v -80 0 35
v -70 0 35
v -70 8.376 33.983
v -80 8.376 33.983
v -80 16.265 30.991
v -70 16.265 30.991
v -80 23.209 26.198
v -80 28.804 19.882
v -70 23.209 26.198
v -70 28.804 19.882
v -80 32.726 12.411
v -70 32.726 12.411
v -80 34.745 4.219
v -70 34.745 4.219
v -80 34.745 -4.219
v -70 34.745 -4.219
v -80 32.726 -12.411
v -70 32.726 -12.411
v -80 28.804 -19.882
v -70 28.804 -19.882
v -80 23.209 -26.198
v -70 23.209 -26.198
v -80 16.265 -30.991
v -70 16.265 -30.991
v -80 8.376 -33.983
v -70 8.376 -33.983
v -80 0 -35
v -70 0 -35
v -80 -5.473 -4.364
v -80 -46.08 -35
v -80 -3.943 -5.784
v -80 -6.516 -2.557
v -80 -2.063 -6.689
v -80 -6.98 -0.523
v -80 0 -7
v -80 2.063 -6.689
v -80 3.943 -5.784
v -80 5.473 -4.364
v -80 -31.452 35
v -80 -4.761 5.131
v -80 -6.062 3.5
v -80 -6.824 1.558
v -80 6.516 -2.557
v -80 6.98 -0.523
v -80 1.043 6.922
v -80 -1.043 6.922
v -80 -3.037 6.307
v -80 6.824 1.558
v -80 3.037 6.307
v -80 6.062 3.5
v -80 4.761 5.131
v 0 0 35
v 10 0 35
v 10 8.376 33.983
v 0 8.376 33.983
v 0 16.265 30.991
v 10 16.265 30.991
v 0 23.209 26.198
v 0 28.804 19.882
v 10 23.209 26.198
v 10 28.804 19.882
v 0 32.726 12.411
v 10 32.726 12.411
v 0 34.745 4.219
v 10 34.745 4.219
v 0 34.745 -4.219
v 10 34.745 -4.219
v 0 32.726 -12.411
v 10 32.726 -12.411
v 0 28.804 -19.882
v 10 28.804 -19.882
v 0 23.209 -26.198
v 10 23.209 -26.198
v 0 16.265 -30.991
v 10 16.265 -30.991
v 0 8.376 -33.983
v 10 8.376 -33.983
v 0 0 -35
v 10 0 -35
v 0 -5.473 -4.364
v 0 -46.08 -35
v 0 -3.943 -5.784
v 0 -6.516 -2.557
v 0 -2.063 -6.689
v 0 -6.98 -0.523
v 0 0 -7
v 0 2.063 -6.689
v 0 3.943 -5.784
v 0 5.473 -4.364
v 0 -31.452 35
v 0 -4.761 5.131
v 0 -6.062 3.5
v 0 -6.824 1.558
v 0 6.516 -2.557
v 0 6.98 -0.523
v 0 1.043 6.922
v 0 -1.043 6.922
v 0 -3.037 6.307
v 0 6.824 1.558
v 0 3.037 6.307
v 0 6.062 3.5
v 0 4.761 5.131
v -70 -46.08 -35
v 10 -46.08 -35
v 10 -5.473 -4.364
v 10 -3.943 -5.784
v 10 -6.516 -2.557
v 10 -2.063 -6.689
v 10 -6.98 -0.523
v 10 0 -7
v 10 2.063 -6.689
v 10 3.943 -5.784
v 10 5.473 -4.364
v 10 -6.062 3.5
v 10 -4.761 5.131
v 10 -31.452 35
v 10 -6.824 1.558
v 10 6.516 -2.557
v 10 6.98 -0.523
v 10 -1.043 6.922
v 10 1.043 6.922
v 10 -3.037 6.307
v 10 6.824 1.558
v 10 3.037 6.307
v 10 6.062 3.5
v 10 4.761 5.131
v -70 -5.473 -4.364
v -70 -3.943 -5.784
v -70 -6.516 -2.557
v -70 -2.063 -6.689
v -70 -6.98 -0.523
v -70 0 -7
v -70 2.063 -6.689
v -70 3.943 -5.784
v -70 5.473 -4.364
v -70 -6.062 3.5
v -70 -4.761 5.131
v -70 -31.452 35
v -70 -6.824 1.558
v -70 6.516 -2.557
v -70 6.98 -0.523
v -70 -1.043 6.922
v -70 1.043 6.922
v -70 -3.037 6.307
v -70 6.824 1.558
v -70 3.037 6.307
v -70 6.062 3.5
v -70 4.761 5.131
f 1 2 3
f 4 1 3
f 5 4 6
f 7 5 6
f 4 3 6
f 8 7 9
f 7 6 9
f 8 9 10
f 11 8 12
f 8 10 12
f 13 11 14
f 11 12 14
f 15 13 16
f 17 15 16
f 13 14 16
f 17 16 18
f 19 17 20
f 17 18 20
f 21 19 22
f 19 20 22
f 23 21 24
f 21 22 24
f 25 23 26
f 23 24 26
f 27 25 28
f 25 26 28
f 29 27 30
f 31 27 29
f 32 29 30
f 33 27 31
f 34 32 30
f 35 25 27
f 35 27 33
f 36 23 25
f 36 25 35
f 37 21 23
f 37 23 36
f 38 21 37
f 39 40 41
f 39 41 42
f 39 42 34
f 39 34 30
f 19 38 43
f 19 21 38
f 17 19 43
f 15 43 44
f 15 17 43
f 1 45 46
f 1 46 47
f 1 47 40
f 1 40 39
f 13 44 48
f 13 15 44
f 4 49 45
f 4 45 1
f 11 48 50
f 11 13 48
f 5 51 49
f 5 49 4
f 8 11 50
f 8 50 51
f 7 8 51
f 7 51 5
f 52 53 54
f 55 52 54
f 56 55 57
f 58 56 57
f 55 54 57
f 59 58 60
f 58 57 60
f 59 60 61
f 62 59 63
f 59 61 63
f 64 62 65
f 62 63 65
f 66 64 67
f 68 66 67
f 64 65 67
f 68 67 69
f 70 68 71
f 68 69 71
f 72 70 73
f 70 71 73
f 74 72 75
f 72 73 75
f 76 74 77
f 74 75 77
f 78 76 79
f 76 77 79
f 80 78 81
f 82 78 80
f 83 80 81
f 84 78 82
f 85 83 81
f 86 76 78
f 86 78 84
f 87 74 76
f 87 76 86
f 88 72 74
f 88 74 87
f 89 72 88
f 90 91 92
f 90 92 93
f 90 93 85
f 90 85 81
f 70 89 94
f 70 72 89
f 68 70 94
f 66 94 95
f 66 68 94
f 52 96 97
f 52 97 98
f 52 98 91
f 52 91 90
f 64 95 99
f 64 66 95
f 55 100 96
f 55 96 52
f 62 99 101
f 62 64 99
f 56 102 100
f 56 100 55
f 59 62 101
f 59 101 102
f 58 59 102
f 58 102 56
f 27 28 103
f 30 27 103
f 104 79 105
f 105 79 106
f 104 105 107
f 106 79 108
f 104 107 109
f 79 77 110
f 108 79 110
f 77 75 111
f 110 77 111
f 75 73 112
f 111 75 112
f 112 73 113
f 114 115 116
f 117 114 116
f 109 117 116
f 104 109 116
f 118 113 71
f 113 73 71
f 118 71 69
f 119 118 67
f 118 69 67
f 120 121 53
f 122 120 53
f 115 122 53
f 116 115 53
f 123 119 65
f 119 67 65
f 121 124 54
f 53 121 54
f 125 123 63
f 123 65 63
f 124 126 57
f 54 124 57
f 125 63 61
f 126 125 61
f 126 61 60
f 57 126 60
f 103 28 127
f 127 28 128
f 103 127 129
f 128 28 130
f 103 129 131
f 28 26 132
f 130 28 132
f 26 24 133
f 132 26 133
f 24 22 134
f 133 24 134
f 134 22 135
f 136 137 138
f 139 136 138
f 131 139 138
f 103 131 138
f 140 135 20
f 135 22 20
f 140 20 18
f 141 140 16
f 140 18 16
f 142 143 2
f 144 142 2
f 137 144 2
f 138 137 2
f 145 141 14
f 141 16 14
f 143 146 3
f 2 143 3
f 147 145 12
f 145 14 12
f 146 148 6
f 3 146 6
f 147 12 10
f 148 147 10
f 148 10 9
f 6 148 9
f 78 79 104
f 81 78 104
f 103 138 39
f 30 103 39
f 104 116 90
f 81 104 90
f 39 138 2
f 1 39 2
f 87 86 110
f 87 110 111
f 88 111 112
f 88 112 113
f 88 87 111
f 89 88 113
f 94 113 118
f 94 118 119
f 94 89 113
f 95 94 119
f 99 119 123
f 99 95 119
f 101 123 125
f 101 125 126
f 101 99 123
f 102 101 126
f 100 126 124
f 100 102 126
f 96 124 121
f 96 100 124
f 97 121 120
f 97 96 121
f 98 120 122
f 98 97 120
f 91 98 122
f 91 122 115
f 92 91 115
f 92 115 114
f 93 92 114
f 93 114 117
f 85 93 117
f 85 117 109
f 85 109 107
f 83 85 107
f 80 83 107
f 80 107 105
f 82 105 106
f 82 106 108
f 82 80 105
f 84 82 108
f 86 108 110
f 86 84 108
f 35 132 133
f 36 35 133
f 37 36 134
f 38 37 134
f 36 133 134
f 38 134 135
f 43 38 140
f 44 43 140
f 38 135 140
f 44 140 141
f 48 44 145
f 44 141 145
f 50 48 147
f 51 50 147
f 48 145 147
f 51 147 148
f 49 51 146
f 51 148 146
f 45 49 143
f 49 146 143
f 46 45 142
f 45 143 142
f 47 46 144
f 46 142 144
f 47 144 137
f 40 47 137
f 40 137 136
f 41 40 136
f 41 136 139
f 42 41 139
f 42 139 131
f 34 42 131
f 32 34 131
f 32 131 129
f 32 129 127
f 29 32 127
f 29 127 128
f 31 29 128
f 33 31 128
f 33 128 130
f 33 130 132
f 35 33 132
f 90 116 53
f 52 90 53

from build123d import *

# Parameters (mm, degrees)
EXTRUDE_1_DEPTH      = 10
EXTRUDE_1_DEPTH_BACK = 80
SKETCH_1_R           = 7
CUT_EXTRUDE_START    = -70
SKETCH_1_2_R         = 7
CUT_EXTRUDE_1_DEPTH  = 70
SKETCH_2_R           = 199.366256812
CUT_EXTRUDE_4_DEPTH  = 284.687476453


with BuildPart() as part:
    # 草图1 → 凸台-拉伸1 (new, two sides: drawn at the far end of the back side and taken through both)
    with BuildSketch(Plane(origin=(0, 0, 0), x_dir=(0, 0, -1), z_dir=(1, 0, 0)).offset(-EXTRUDE_1_DEPTH_BACK)):
        with BuildLine():
            Line((35, 0), (35, -100))
            Line((35, -100), (-35, -100))
            Line((-35, -100), (-35, 0))
            ThreePointArc((-35, 0), (0, 35), (35, 0))
        make_face()
        Circle(SKETCH_1_R, mode=Mode.SUBTRACT)
    extrude(amount=EXTRUDE_1_DEPTH + EXTRUDE_1_DEPTH_BACK)

    # 草图1<2> → 切除-拉伸1 (cut)
    with BuildSketch(Plane(origin=(0, 0, 0), x_dir=(0, 0, -1), z_dir=(1, 0, 0)).offset(CUT_EXTRUDE_START)):
        with BuildLine():
            Line((35, 0), (35, -100))
            Line((35, -100), (-35, -100))
            Line((-35, -100), (-35, 0))
            ThreePointArc((-35, 0), (0, 35), (35, 0))
        make_face()
        Circle(SKETCH_1_2_R, mode=Mode.SUBTRACT)
    extrude(amount=CUT_EXTRUDE_1_DEPTH, mode=Mode.SUBTRACT)


with BuildPart() as cut_extrude_1_piece_1:
    # of the separate pieces the step leaves, piece 1, a body of its own (cut_extrude_1_pieces)
    add(part.part.solids().sort_by_distance((0, 0, -35))[0])


with BuildPart() as cut_extrude_1_piece_2:
    # of the separate pieces the step leaves, piece 2, a body of its own (cut_extrude_1_pieces)
    add(part.part.solids().sort_by_distance((-80, 0, -35))[0])


with BuildPart() as cut_extrude_4_tool:
    # 草图2 → 切除-拉伸4 (new body)
    with BuildSketch(Plane(origin=(0, -37.143957238, 7.762028428), x_dir=(-1, 0, 0), z_dir=(0, 0.9788555101327263, -0.20455290338394244))):
        Circle(SKETCH_2_R)
    extrude(amount=-CUT_EXTRUDE_4_DEPTH)


with BuildPart() as cut_extrude_1_piece_1_1:
    add(cut_extrude_1_piece_1.part)

    # 切除-拉伸4: cut by cut_extrude_4_tool
    add(cut_extrude_4_tool.part, mode=Mode.SUBTRACT)


with BuildPart() as cut_extrude_1_piece_2_1:
    add(cut_extrude_1_piece_2.part)

    # 切除-拉伸4: cut by cut_extrude_4_tool
    add(cut_extrude_4_tool.part, mode=Mode.SUBTRACT)


solid = Compound([cut_extrude_1_piece_1_1.part, cut_extrude_1_piece_2_1.part])
